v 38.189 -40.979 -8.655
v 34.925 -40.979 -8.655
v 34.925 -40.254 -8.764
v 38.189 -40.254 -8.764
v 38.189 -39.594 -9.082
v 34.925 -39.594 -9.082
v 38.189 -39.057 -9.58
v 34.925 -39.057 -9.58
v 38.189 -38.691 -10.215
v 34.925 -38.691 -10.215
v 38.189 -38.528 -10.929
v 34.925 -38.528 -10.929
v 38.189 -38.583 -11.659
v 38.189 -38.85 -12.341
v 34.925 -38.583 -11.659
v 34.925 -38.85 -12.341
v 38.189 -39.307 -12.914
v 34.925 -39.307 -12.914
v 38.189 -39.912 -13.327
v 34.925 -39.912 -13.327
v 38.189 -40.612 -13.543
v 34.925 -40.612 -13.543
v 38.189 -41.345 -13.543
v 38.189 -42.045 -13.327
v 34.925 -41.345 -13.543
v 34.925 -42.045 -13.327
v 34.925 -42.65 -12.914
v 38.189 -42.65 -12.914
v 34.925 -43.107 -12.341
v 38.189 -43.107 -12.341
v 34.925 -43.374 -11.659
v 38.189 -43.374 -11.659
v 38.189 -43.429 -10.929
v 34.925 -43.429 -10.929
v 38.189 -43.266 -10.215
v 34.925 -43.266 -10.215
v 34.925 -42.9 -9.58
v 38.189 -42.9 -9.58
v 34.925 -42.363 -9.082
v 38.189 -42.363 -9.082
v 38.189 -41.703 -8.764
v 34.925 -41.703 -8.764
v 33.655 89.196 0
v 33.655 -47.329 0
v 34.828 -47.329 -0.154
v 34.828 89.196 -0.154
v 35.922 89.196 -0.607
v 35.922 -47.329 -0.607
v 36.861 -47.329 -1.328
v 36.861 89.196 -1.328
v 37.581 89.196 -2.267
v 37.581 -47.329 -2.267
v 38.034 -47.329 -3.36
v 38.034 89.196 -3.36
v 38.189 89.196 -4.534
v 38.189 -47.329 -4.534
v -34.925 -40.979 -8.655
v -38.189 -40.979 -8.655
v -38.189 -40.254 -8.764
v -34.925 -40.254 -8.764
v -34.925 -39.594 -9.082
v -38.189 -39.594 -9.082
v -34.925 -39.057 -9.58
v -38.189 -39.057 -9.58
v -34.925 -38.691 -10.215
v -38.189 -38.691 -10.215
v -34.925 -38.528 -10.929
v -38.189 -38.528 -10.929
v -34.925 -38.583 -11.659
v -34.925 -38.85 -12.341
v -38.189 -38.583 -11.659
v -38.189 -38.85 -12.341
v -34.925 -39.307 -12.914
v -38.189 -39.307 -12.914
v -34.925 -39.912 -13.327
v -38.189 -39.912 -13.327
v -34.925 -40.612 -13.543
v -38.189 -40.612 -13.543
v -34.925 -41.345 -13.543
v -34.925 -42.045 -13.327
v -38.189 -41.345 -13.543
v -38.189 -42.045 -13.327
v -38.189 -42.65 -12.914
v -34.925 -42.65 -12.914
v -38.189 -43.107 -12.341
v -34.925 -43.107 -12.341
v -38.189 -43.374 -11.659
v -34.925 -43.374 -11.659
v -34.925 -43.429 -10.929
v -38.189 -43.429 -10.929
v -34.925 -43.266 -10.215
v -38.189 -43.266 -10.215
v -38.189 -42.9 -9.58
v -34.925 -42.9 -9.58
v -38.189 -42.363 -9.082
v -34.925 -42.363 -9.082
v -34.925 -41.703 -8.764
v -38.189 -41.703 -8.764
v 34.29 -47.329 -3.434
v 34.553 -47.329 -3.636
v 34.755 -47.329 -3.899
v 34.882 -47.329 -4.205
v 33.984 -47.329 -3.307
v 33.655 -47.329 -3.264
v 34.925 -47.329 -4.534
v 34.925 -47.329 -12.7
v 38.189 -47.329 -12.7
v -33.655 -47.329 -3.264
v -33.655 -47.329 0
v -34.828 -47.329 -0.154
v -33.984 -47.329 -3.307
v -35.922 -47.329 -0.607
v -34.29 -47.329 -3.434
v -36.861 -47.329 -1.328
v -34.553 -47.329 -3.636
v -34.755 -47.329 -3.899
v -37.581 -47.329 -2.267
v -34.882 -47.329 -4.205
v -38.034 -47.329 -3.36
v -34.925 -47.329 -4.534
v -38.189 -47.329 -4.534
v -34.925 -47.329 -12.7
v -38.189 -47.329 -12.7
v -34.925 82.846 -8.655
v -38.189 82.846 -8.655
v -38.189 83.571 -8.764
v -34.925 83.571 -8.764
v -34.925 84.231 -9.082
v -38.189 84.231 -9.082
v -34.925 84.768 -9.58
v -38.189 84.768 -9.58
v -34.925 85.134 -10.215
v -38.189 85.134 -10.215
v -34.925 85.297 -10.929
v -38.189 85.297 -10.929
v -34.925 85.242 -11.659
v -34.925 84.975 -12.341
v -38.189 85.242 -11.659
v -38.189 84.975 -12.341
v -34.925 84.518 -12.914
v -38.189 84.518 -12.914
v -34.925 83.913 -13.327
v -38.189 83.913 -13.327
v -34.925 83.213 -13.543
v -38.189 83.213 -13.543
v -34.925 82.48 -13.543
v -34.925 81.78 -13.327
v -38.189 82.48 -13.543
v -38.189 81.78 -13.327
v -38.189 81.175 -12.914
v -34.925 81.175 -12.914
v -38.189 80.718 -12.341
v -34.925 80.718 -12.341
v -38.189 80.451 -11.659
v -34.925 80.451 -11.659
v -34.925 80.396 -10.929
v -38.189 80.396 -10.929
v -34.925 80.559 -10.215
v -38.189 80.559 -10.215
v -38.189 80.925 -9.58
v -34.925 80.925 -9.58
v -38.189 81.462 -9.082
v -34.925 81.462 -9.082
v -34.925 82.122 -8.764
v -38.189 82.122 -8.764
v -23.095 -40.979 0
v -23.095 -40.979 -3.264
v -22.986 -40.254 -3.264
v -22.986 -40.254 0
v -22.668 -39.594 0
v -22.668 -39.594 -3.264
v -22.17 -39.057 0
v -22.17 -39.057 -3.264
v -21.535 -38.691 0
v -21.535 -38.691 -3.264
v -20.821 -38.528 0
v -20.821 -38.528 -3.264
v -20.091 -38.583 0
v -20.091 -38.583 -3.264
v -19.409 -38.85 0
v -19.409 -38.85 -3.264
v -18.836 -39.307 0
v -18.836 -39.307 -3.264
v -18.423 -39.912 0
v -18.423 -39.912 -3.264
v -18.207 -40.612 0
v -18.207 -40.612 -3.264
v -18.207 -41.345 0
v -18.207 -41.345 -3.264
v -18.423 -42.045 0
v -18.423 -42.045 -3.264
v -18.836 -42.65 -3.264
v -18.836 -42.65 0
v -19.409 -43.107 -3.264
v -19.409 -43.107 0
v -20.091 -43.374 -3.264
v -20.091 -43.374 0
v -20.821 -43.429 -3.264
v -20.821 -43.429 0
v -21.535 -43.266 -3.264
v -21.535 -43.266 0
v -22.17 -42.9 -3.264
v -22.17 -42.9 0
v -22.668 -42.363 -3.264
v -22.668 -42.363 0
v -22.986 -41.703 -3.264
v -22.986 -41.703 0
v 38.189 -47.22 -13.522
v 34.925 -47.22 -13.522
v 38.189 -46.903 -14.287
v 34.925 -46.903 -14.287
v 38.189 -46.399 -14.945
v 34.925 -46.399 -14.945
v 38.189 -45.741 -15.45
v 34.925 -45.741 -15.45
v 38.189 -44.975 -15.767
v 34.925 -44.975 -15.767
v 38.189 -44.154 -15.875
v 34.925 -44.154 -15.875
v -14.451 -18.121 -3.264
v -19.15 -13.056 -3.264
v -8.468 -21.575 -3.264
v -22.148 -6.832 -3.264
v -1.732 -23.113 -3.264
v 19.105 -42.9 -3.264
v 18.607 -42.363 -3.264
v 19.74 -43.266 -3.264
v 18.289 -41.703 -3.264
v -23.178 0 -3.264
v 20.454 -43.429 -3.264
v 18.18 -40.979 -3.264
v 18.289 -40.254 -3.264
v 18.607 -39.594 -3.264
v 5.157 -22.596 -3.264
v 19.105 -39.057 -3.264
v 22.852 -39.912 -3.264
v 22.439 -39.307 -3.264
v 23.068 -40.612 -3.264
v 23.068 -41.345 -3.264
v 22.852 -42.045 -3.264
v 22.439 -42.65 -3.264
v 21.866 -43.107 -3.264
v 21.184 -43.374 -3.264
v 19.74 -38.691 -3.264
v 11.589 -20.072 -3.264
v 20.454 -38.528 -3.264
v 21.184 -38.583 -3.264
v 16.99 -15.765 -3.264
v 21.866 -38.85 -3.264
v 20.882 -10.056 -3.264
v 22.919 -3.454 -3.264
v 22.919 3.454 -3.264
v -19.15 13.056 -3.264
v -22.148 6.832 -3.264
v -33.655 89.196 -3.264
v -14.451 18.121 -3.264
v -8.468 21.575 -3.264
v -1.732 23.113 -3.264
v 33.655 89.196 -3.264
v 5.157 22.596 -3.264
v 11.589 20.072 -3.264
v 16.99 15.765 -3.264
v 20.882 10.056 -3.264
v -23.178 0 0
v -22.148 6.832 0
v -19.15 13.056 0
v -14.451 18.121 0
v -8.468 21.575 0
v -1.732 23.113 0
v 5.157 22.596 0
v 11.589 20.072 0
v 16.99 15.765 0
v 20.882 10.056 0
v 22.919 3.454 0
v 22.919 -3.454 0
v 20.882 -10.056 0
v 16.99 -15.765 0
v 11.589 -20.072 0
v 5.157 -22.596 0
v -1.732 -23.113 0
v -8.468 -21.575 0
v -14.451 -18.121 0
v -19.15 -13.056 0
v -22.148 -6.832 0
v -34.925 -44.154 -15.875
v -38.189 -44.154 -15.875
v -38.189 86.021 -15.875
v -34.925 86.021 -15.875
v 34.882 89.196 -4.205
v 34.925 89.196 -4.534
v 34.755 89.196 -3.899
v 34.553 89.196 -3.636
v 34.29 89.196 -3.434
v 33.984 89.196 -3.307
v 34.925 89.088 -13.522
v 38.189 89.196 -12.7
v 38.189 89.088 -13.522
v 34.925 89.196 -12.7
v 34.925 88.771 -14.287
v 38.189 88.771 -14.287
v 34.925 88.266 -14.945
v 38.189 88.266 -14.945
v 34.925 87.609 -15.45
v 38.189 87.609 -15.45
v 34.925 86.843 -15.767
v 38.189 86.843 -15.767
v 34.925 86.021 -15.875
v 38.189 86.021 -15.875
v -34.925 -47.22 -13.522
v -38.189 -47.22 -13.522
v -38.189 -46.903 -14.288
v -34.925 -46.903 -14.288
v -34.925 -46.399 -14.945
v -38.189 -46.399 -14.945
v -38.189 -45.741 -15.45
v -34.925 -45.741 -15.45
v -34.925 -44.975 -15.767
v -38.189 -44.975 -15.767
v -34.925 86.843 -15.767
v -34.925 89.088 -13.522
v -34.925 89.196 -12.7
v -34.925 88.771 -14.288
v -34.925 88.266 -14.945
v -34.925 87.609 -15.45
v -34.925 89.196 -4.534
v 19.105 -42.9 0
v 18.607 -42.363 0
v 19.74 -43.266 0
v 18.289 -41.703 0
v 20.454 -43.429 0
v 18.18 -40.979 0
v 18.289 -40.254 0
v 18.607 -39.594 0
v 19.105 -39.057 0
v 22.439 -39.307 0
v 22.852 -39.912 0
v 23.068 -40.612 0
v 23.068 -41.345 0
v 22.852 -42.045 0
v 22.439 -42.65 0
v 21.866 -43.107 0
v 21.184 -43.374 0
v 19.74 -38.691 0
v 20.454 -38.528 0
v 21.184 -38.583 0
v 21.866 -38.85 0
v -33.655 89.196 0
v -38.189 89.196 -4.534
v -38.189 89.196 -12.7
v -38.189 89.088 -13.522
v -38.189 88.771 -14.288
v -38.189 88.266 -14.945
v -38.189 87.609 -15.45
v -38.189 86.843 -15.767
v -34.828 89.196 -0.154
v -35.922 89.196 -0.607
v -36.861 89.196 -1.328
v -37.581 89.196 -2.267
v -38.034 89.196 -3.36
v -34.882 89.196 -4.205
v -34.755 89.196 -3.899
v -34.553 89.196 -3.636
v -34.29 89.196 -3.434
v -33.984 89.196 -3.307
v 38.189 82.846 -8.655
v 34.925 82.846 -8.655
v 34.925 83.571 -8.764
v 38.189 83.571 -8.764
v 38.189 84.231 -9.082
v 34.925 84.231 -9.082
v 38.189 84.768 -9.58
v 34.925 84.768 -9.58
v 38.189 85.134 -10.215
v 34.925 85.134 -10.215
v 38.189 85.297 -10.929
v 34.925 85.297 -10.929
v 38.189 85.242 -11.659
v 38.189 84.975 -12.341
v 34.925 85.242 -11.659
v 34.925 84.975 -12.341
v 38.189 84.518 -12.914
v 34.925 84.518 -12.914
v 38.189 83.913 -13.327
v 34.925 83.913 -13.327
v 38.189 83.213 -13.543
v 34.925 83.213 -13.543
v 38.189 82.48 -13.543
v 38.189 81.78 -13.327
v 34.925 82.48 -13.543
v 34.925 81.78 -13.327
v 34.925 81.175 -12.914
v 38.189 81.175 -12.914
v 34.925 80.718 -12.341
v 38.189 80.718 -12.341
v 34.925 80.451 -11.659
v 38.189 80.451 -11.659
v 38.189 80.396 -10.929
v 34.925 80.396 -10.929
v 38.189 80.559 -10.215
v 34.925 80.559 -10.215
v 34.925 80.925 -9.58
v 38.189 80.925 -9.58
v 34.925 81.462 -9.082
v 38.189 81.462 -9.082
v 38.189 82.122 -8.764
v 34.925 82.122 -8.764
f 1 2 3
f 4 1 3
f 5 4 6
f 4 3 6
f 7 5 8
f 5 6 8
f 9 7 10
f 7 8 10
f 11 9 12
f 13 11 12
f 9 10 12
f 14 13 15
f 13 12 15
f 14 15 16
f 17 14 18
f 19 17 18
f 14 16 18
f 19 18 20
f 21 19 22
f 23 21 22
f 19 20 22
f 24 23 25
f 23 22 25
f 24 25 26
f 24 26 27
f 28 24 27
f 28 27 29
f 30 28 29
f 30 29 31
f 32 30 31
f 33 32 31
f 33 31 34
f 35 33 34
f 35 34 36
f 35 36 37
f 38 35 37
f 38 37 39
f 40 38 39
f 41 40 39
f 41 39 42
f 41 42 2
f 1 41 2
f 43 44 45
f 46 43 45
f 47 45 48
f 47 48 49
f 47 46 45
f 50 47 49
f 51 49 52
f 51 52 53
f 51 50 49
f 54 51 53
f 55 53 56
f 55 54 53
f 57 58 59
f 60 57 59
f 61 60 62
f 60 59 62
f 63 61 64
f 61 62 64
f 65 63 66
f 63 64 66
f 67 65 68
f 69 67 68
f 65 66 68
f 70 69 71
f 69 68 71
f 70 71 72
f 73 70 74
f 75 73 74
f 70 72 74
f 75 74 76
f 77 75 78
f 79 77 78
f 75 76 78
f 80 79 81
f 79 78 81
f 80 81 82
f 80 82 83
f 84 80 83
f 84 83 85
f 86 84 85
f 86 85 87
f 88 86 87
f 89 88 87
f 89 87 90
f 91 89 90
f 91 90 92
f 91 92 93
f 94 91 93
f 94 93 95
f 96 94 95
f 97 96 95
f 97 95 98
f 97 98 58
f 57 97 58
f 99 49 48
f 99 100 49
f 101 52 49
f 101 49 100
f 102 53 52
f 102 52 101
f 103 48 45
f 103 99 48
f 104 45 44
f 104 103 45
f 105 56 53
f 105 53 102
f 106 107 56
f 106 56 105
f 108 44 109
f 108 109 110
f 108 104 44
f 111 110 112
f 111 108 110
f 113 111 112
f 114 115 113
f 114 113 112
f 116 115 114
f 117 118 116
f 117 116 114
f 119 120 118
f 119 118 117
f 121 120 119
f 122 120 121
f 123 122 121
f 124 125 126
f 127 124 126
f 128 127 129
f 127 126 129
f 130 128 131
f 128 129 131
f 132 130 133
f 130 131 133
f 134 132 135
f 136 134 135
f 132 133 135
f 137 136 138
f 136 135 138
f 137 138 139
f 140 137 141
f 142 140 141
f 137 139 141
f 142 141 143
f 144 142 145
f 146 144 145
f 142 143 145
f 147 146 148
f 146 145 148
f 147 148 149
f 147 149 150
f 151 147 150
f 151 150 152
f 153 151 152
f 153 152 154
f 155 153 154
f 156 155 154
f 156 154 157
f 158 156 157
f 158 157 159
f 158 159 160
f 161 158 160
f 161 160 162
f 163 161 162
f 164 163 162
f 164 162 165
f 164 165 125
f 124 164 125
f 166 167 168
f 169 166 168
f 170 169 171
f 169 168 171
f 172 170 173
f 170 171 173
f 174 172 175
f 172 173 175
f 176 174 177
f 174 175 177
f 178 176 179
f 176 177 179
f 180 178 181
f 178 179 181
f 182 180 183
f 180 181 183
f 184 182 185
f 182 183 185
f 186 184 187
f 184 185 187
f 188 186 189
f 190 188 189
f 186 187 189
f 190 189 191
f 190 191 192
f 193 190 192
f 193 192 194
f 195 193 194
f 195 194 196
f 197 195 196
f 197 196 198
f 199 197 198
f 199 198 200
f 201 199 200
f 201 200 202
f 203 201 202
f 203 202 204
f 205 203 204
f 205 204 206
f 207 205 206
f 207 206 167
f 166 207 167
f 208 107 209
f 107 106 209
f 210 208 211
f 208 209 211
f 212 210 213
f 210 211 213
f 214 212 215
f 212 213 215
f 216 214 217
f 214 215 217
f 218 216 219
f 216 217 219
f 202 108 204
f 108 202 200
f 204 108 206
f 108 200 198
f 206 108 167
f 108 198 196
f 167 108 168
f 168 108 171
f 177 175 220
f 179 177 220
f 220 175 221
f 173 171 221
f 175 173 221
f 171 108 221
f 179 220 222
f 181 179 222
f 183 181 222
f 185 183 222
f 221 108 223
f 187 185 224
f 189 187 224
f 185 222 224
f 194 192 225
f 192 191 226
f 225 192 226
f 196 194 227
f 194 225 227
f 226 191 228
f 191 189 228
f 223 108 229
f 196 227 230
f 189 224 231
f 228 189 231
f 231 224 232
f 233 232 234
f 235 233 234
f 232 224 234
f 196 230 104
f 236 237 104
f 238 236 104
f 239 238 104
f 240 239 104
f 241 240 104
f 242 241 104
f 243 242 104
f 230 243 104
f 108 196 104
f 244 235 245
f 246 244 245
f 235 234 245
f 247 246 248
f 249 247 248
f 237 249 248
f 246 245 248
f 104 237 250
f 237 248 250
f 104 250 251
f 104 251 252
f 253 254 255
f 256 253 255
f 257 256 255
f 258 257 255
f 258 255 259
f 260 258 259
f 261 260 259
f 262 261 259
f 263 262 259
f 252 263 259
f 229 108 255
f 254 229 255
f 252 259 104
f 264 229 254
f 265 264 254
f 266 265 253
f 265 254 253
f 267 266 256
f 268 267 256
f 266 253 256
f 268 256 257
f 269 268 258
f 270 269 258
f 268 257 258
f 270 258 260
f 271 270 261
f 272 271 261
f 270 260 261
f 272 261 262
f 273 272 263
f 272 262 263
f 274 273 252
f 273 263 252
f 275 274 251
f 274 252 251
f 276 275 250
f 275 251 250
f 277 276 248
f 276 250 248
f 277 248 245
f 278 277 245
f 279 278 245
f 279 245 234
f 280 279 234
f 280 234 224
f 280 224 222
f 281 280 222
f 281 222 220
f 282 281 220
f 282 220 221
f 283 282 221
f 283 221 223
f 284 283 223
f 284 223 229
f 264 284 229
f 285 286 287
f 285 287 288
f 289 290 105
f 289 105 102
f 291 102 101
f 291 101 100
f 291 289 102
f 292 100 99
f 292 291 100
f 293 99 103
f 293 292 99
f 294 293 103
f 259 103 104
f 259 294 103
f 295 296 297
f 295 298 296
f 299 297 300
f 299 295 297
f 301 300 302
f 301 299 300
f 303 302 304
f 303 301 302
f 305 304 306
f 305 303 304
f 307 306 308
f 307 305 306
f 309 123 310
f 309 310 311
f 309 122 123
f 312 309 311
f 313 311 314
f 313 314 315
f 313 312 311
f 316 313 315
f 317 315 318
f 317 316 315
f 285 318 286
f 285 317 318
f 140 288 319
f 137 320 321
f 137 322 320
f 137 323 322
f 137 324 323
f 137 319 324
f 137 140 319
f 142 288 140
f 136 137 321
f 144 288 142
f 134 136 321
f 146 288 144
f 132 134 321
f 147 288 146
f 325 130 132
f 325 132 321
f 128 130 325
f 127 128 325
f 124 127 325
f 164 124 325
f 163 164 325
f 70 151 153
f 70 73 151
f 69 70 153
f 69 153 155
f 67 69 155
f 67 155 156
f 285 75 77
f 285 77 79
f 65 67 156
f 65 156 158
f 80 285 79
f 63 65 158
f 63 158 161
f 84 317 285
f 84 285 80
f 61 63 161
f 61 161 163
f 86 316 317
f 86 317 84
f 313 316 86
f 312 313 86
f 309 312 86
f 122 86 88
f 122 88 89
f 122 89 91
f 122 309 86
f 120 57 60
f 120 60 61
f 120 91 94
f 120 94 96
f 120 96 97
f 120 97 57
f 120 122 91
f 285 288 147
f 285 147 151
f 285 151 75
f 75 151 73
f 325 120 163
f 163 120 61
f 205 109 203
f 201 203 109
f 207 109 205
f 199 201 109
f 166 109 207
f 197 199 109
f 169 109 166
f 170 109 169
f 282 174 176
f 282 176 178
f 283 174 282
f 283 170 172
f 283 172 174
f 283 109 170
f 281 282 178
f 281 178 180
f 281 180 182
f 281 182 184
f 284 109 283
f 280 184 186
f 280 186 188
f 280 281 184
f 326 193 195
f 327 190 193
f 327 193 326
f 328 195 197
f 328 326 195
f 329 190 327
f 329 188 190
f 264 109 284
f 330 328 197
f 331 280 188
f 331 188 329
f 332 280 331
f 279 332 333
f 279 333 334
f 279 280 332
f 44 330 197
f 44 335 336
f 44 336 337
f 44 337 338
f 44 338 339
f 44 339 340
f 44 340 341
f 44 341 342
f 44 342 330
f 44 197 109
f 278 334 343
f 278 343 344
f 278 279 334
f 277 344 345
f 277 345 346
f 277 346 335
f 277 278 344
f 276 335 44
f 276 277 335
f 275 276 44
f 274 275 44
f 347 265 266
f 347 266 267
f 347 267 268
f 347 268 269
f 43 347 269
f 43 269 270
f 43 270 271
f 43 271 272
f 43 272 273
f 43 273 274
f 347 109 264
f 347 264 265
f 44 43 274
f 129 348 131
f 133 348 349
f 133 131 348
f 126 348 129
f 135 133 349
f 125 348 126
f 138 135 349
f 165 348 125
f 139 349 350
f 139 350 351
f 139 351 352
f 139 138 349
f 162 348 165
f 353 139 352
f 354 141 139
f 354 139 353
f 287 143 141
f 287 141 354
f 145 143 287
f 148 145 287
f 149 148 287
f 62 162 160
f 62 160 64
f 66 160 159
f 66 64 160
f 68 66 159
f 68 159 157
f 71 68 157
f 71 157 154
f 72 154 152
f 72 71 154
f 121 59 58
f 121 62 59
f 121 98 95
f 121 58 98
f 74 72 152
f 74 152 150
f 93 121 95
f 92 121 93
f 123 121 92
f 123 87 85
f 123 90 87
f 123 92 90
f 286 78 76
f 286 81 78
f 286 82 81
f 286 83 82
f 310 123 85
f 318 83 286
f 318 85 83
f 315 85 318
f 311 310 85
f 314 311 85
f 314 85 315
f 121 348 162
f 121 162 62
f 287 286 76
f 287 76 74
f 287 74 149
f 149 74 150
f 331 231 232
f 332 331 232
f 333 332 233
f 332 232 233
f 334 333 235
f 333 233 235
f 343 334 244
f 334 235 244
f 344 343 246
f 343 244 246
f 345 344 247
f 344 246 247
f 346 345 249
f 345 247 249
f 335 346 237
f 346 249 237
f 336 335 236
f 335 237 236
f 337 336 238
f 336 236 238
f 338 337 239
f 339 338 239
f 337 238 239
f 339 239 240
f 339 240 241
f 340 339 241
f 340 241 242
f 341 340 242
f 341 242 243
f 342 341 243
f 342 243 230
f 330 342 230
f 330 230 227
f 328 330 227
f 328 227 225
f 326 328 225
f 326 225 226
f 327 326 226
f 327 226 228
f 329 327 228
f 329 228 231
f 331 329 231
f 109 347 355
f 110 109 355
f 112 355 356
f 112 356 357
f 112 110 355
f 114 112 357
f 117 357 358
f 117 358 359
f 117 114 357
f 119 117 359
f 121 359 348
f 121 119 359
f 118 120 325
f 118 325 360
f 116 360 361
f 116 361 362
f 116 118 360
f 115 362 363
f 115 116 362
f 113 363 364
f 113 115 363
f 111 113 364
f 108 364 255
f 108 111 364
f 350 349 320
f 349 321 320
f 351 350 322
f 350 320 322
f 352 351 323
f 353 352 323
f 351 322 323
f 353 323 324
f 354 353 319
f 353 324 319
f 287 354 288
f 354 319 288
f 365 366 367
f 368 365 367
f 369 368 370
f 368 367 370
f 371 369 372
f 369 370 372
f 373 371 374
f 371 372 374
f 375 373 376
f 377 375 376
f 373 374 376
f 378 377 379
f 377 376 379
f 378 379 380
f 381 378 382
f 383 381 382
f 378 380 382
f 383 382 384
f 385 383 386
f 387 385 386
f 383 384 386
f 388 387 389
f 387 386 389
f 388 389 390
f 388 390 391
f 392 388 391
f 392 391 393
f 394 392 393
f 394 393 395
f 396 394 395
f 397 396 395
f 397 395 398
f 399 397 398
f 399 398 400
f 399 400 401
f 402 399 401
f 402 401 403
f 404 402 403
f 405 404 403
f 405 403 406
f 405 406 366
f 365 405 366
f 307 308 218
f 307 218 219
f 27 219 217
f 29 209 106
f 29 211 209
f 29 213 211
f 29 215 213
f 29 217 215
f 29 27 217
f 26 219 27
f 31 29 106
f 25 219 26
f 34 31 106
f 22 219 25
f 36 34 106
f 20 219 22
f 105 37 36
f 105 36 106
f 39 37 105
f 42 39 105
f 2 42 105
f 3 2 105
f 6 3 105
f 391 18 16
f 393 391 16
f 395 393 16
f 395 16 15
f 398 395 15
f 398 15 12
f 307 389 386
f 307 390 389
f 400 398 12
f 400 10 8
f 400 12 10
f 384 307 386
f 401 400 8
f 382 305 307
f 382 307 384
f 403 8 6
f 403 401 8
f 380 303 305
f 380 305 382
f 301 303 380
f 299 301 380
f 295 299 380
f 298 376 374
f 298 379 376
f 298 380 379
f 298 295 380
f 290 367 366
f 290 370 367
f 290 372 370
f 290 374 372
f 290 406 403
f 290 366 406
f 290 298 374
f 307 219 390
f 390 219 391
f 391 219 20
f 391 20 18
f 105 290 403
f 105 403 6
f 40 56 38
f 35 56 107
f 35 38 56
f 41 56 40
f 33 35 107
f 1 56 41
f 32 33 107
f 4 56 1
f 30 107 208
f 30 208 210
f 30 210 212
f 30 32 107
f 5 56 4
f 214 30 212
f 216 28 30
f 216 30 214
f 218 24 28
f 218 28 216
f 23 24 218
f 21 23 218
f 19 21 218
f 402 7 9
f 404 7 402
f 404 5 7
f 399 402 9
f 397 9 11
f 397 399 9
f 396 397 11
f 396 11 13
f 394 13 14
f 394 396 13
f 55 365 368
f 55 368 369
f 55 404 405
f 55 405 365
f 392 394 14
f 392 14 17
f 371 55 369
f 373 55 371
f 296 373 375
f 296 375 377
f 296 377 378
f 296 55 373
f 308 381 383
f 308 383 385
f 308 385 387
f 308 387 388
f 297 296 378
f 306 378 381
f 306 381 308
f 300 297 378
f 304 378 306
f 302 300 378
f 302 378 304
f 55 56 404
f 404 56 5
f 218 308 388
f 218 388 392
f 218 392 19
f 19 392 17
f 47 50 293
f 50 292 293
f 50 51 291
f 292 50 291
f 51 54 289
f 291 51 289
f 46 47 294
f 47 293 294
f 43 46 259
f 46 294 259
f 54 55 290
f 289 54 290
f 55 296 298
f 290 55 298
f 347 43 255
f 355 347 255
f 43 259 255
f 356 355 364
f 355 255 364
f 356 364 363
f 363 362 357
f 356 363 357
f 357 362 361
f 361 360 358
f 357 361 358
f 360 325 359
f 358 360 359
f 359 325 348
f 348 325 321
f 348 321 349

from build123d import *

# Parameters (mm, degrees)
SKETCH1_W                      = 76.3778
SKETCH1_H                      = 136.525
BASE_FLANGE1_DEPTH             = 3.2639
EDGE_FLANGE1_STRIP_W           = 15.5956
EDGE_FLANGE1_STRIP_H           = 3.2639
EDGE_FLANGE1_STRIP_CUT_DEPTH   = 136.525
EDGE_FLANGE1_STRIP_2_W         = 15.5956
EDGE_FLANGE1_STRIP_2_H         = 3.2639
EDGE_FLANGE1_STRIP_CUT_2_DEPTH = 136.525
EDGE_FLANGE1_DEPTH             = 136.525
EDGE_FLANGE1_BEND_DEPTH        = 136.525
F_10_0_1935_DIAMETER_HOLE1_D   = 4.9149
SKETCH32_R                     = 23.1775
CUT_EXTRUDE1_DEPTH             = 98.843921173
F_10_0_1935_DIAMETER_HOLE2_D   = 4.9149
FILLET1_R                      = 3.175


# Sheet-metal steps are written as plain solids
with BuildPart() as part:
    # Sketch1 → Base-Flange1 (new body)
    with BuildSketch(Plane.XY):
        with Locations((0, 20.933918)):
            Rectangle(SKETCH1_W, SKETCH1_H)
    extrude(amount=-BASE_FLANGE1_DEPTH)

    # Edge-Flange1 strip (across the edge) → Edge-Flange1 strip cut (cut)
    with BuildSketch(Plane(origin=(38.1889, 89.196418, -3.2639), x_dir=(-1, 0, 0), z_dir=(0, -1, 0))):
        with Locations((-3.2639, -1.63195)):
            Rectangle(EDGE_FLANGE1_STRIP_W, EDGE_FLANGE1_STRIP_H)
    extrude(amount=EDGE_FLANGE1_STRIP_CUT_DEPTH, mode=Mode.SUBTRACT)

    # Edge-Flange1 strip 2 (across the edge) → Edge-Flange1 strip cut 2 (cut)
    with BuildSketch(Plane(origin=(-38.1889, -47.328582, -3.2639), x_dir=(1, 0, 0), z_dir=(0, 1, 0))):
        with Locations((-3.2639, -1.63195)):
            Rectangle(EDGE_FLANGE1_STRIP_2_W, EDGE_FLANGE1_STRIP_2_H)
    extrude(amount=EDGE_FLANGE1_STRIP_CUT_2_DEPTH, mode=Mode.SUBTRACT)

    # Edge-Flange1 section (across the edge) → Edge-Flange1 (add)
    with BuildSketch(Plane(origin=(38.1889, 89.196418, -3.2639), x_dir=(-1, 0, 0), z_dir=(0, -1, 0))):
        with BuildLine():
            Line((0, 1.27), (0, 12.6111))
            Line((0, 12.6111), (3.2639, 12.6111))
            Line((3.2639, 12.6111), (3.2639, 1.27))
            ThreePointArc((3.2639, 1.27), (3.635874388, 0.371974388), (4.5339, 0))
            Line((4.5339, 0), (4.5339, -3.2639))
            ThreePointArc((4.5339, -3.2639), (1.327948565, -1.935951435), (0, 1.27))
        make_face()
    extrude(amount=EDGE_FLANGE1_DEPTH)

    # Edge-Flange1 section 2 (across the edge) → Edge-Flange1 bend (add)
    with BuildSketch(Plane(origin=(-38.1889, -47.328582, -3.2639), x_dir=(1, 0, 0), z_dir=(0, 1, 0))):
        with BuildLine():
            Line((0, 1.27), (0, 12.6111))
            Line((0, 12.6111), (3.2639, 12.6111))
            Line((3.2639, 12.6111), (3.2639, 1.27))
            ThreePointArc((3.2639, 1.27), (3.635874388, 0.371974388), (4.5339, 0))
            Line((4.5339, 0), (4.5339, -3.2639))
            ThreePointArc((4.5339, -3.2639), (1.327948565, -1.935951435), (0, 1.27))
        make_face()
    extrude(amount=EDGE_FLANGE1_BEND_DEPTH)

    # #10 (0.1935) Diameter Hole1 (through all)
    with Locations(Plane(origin=(38.1889, 0, 0), x_dir=(0, 0, -1), z_dir=(1, 0, 0))):
        with Locations((11.1125, 82.846418), (11.1125, -40.978582)):
            Hole(F_10_0_1935_DIAMETER_HOLE1_D / 2)

    # Sketch32 → Cut-Extrude1 (cut, through all)
    with BuildSketch(Plane(origin=(0, 0, -3.2639), x_dir=(-1, 0, 0), z_dir=(0, 0, -1))):
        Circle(SKETCH32_R)
    extrude(amount=-CUT_EXTRUDE1_DEPTH, mode=Mode.SUBTRACT)

    # #10 (0.1935) Diameter Hole2 (through all)
    with Locations(Plane.XY):
        with Locations((-20.6375, -40.978582), (20.6375, -40.978582)):
            Hole(F_10_0_1935_DIAMETER_HOLE2_D / 2)

    # Fillet1
    fillet1_edges = [part.edges().sort_by_distance(p)[0] for p in [
        (36.55695, 89.196418, -15.875),
        (36.55695, -47.328582, -15.875),
        (-36.55695, -47.328582, -15.875),
        (-36.55695, 89.196418, -15.875),
    ]]
    fillet(fillet1_edges, radius=FILLET1_R)


solid = part.part
